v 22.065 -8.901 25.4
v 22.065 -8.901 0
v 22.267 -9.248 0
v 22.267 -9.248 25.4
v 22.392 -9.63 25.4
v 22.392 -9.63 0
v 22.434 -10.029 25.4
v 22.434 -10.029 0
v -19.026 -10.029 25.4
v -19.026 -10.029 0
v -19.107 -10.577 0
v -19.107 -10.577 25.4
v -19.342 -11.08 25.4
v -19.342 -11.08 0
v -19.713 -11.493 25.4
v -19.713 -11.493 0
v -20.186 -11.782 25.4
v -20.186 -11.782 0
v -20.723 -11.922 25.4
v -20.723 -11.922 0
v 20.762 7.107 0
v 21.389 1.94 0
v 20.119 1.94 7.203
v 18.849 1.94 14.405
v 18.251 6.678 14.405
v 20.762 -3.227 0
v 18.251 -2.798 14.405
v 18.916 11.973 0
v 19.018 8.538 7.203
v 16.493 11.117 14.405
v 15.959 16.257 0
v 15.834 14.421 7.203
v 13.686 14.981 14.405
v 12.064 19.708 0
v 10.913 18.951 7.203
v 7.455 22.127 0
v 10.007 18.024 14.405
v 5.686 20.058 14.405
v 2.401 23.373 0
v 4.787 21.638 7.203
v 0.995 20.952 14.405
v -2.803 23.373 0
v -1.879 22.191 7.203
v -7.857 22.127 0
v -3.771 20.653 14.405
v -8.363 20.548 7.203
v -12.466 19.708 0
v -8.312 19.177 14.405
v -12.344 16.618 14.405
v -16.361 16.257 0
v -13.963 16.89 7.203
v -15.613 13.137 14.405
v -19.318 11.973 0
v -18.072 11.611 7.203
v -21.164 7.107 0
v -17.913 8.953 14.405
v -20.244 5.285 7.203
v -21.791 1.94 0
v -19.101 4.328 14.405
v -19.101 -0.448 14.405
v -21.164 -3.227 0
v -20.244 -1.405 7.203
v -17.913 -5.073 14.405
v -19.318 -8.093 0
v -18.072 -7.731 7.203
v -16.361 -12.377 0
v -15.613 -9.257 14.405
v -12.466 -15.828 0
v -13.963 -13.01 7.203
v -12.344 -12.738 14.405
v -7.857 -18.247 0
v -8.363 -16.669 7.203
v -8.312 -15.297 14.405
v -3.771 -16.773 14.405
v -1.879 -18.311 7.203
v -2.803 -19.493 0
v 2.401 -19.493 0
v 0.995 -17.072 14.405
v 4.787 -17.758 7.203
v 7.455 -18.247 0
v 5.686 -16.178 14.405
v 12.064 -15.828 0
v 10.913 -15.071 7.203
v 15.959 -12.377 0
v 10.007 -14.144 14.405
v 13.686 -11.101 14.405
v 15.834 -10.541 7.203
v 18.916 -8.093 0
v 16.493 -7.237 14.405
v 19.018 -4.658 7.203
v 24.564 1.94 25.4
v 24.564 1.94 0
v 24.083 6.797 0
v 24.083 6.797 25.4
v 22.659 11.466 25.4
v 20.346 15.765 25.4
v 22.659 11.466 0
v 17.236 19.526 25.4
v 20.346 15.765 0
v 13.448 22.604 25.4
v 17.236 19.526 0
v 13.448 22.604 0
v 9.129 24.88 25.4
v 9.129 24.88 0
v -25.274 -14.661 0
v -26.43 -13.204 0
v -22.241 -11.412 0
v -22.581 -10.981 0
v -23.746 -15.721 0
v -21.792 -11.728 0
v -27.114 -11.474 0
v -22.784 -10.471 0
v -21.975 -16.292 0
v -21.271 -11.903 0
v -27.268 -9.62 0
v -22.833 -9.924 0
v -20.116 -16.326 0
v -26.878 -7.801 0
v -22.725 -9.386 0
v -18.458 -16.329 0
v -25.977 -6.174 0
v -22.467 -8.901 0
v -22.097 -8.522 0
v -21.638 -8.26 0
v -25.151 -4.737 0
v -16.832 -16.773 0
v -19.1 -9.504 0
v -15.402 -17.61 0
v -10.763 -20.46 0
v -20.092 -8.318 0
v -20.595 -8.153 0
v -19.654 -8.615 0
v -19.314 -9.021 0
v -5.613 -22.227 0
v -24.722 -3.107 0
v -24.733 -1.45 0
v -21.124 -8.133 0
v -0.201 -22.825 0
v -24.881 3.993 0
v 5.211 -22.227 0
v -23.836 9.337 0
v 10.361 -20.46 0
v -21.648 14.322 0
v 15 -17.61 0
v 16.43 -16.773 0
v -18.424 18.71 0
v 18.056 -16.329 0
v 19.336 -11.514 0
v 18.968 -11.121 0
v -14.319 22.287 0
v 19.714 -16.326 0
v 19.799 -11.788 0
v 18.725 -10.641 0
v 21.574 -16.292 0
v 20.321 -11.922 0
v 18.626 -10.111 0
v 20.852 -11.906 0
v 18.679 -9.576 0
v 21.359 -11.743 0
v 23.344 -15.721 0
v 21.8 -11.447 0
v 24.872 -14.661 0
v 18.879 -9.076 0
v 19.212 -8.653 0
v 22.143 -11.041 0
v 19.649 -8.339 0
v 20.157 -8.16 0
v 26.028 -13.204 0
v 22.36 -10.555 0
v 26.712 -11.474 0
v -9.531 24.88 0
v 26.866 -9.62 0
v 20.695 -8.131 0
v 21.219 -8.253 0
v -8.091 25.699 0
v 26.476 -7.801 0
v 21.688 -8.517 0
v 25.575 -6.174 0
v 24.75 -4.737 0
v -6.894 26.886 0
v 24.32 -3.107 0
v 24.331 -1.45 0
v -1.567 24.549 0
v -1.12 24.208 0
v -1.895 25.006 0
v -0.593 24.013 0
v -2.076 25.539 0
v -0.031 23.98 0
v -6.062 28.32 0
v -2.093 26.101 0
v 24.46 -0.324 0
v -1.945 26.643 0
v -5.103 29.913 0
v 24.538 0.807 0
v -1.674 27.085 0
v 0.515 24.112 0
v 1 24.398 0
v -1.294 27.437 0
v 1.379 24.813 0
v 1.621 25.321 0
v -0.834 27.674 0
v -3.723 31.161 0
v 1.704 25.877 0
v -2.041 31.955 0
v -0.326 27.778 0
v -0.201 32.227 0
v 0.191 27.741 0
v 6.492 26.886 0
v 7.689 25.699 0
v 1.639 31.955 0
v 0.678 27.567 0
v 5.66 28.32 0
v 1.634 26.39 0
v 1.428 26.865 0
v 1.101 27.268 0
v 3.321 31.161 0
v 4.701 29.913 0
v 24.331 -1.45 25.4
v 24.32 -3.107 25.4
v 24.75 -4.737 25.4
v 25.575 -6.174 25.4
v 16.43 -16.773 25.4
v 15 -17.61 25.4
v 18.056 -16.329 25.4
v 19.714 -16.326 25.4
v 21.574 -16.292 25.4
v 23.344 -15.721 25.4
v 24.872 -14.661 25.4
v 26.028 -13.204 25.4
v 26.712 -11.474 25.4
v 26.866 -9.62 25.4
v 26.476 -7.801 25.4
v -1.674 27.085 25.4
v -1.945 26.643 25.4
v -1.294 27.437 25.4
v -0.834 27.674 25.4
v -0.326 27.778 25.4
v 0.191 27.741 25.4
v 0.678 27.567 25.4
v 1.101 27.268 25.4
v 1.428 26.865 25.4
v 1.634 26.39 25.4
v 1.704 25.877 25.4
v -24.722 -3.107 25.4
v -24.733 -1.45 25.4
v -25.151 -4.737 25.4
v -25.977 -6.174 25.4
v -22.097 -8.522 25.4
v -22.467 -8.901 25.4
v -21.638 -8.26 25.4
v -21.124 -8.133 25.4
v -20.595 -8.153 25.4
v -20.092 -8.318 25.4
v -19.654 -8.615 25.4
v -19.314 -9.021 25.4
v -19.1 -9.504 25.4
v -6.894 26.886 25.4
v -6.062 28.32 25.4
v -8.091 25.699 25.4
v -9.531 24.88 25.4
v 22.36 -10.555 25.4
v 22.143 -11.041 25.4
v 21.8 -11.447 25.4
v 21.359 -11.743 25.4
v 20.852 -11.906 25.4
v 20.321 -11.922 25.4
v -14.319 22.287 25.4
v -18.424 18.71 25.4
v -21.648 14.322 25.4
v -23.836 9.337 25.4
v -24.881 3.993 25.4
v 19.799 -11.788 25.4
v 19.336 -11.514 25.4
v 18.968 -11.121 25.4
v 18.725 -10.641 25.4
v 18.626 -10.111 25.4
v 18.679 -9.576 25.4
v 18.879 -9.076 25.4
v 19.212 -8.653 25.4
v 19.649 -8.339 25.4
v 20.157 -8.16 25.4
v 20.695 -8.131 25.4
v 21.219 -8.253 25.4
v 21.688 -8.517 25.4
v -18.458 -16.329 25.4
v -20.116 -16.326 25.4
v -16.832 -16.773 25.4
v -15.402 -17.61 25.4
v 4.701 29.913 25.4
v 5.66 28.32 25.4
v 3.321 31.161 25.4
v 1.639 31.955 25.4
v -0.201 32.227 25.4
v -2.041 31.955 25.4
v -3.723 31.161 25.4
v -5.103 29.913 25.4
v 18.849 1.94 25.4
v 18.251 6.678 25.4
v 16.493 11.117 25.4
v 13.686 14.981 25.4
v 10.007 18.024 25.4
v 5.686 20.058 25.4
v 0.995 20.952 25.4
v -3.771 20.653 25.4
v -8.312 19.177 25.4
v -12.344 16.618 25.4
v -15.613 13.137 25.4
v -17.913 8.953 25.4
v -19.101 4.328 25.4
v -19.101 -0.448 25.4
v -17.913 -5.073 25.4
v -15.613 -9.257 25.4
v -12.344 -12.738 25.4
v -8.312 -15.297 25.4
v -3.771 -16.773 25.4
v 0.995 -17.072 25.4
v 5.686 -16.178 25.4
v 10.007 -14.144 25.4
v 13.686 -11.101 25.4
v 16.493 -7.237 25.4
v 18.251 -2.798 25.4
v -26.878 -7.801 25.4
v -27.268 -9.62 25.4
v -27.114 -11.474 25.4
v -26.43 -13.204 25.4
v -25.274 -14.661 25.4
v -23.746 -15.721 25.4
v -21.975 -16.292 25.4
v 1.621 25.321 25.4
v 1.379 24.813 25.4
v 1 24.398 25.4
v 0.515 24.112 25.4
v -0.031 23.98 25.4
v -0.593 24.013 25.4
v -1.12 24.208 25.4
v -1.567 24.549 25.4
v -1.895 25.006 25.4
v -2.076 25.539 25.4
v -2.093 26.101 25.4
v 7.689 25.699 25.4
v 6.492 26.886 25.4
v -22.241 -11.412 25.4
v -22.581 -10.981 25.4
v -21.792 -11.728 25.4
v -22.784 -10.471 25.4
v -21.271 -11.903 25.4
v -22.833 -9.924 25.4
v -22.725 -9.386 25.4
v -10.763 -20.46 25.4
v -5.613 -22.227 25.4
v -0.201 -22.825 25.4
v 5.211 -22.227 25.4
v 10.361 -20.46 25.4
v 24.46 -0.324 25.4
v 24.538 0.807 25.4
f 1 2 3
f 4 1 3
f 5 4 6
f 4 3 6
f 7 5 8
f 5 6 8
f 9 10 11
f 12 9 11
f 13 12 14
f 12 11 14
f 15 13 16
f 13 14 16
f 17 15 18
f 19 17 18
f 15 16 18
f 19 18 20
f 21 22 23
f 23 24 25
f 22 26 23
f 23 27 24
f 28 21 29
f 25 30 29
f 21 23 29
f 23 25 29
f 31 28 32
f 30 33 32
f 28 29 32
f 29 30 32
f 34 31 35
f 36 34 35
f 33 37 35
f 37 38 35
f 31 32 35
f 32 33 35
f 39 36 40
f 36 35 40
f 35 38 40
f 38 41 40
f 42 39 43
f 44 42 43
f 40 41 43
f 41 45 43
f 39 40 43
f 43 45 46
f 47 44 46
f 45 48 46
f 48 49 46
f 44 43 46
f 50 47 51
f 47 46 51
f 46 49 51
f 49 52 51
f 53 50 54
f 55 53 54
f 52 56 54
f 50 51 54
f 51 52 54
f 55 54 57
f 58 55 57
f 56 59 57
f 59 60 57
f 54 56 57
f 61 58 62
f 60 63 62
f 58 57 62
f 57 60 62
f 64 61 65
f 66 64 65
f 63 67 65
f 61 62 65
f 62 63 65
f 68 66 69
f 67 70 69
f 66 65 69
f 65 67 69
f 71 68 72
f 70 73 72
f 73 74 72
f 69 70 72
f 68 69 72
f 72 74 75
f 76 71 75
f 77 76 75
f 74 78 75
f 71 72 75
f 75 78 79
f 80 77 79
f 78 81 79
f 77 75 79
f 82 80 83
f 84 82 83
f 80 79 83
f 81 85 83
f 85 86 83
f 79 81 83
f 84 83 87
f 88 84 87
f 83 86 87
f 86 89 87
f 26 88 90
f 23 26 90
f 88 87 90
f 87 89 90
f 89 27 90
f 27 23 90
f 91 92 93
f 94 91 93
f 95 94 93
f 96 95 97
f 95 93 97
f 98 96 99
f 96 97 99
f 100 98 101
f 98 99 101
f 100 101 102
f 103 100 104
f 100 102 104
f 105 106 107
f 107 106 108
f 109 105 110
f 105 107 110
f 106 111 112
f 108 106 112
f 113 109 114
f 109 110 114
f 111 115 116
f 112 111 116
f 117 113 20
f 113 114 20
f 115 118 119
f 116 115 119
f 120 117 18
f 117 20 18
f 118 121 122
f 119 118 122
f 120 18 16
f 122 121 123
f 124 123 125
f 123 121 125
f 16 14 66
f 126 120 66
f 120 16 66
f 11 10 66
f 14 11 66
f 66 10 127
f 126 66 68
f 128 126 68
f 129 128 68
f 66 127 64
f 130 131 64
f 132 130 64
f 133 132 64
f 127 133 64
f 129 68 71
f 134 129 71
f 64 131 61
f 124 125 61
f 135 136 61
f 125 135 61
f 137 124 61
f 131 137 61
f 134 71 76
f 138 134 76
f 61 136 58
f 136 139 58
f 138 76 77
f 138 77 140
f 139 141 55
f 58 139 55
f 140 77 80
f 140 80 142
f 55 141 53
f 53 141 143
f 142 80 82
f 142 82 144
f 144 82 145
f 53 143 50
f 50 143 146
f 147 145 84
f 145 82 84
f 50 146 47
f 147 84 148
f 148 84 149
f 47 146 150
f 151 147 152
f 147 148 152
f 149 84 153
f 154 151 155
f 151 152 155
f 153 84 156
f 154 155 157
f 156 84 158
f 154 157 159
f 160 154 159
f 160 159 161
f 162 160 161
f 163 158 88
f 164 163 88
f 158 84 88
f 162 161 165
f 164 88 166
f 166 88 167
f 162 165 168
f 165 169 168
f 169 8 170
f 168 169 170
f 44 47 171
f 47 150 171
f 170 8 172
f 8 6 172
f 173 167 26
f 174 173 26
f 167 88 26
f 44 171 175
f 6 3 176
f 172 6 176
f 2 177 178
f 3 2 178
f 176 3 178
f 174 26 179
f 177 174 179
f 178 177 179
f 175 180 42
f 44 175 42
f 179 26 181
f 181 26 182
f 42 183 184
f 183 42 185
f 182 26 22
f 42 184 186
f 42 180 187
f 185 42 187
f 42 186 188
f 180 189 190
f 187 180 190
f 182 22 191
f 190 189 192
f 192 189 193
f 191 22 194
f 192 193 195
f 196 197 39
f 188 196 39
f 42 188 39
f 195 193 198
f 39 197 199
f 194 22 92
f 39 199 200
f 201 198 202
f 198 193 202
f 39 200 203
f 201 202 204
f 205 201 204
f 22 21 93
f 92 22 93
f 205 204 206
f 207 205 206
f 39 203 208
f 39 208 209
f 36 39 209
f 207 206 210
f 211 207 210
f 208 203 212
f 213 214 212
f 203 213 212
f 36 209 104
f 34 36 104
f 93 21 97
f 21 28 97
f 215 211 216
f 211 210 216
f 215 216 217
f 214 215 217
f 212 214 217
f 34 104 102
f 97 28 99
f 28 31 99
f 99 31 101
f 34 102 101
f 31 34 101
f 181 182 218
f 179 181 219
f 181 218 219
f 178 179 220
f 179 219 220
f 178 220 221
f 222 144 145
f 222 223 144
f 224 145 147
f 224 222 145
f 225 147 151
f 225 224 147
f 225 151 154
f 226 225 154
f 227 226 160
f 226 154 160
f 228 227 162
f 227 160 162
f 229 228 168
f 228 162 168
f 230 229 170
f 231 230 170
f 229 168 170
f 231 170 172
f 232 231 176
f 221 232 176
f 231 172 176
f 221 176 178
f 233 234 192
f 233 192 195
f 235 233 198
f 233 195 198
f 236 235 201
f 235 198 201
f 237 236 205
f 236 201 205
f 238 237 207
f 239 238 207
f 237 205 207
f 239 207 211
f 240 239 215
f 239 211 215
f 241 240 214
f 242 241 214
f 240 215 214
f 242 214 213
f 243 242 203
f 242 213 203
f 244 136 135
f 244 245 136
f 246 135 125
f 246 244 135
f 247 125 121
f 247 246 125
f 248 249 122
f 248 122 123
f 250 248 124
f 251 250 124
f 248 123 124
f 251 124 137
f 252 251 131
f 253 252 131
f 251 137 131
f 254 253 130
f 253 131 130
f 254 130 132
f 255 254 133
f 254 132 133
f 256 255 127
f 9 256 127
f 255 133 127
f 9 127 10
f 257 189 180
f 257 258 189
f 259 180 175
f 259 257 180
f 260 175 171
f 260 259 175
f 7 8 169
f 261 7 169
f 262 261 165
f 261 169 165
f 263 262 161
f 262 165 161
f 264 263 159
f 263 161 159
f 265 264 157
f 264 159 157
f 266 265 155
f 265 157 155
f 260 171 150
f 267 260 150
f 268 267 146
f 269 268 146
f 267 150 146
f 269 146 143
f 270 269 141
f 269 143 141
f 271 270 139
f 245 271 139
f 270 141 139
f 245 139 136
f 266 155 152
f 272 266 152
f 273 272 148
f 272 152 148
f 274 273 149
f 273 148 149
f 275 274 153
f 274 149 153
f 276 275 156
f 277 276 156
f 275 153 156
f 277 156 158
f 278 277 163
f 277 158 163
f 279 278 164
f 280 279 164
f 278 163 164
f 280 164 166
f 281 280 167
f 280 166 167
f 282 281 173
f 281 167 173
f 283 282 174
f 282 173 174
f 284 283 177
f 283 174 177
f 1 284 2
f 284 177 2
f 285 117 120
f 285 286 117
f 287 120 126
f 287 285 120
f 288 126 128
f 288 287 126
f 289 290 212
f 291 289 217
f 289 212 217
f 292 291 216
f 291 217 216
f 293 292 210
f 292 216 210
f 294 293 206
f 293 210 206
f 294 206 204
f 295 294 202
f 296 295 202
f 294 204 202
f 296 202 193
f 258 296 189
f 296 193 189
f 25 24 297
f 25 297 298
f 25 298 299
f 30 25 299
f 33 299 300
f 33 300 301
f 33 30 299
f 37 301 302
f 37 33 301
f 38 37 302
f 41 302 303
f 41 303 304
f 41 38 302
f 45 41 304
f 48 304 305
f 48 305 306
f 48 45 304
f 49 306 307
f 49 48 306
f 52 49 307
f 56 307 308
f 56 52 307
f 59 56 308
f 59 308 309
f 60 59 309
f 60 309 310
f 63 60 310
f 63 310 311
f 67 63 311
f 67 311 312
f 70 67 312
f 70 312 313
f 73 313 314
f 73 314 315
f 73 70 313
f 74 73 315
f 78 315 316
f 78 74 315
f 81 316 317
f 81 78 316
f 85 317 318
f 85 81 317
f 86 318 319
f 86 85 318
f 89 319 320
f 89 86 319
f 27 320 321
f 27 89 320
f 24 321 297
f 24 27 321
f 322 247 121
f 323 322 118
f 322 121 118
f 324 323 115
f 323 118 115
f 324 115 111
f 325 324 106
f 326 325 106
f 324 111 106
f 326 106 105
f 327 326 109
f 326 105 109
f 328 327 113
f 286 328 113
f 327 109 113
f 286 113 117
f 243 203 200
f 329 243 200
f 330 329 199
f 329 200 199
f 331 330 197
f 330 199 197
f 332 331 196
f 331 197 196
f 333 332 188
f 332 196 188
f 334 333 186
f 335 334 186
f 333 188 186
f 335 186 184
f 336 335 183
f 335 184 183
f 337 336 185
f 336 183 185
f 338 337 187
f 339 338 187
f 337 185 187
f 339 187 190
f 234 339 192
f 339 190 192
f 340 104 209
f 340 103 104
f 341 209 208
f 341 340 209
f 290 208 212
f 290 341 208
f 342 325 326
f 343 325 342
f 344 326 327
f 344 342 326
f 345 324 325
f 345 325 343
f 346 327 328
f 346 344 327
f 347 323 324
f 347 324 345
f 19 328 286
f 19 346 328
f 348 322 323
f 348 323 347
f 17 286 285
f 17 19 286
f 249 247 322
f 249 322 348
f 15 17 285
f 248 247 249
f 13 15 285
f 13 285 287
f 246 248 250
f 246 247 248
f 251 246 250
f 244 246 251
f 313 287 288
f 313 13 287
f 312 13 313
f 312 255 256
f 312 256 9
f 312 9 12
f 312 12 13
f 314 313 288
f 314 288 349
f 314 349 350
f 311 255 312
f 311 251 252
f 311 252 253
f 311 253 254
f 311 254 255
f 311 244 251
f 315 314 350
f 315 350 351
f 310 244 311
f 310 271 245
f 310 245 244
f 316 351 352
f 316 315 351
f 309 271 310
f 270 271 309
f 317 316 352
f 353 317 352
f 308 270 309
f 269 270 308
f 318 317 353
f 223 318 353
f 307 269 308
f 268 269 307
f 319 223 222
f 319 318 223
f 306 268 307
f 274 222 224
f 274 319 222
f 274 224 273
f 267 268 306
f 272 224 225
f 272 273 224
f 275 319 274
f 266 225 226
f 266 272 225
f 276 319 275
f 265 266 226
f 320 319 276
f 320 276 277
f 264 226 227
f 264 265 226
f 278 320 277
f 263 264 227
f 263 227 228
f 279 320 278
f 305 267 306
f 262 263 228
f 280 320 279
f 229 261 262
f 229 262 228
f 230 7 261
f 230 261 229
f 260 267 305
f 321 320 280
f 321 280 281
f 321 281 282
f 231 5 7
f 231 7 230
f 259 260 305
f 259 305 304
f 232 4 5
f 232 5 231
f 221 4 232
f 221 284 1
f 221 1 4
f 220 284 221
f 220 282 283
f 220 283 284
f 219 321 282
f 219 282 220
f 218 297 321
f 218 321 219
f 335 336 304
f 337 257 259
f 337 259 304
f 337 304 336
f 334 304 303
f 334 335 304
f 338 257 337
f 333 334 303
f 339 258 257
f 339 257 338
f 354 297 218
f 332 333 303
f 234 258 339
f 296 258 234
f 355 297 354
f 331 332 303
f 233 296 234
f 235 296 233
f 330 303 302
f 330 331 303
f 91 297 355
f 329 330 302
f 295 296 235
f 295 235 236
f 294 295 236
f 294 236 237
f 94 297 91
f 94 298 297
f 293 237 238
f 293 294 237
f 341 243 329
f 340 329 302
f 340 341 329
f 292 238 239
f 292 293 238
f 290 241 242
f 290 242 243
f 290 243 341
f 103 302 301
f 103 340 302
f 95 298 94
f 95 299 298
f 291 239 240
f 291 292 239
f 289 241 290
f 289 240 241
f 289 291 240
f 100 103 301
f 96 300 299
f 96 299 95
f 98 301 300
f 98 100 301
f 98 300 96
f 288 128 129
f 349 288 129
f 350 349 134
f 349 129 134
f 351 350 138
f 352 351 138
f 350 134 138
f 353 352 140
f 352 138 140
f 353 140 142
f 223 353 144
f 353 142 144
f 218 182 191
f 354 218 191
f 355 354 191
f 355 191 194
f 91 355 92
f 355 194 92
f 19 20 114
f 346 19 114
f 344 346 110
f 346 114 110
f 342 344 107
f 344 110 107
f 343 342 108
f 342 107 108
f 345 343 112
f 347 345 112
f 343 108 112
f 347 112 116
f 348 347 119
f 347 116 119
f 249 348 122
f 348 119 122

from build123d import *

# Parameters (mm, degrees)
F0_R     = 19.05
F1_DEPTH = 25.4
F2_R     = 6.35
F3_SIZE2 = 14.4050558218
F3_SIZE  = 2.54


with BuildPart() as f1:
    # F0 (on Top) → F1 (new body)
    with BuildSketch(Plane.XY):
        with BuildLine():
            ThreePointArc((23.7041161885, -4.5293078328), (24.3480999851, -1.3231236326), (24.564016243, 1.9399596371))
            ThreePointArc((24.564016243, 1.9399596371), (19.4276047684, 17.0404145143), (6.149016243, 25.8770172048))
            ThreePointArc((6.149016243, 25.8770172048), (3.8641251316, 26.3690430158), (1.5430253852, 26.6434747131))
            ThreePointArc((1.5430253852, 26.6434747131), (1.6633341365, 26.2686085633), (1.704016243, 25.8770172048))
            ThreePointArc((1.704016243, 25.8770172048), (-0.5925751155, 24.0126993113), (-1.9449928991, 26.6434747131))
            ThreePointArc((-1.9449928991, 26.6434747131), (-4.2660926456, 26.3690430158), (-6.550983757, 25.8770172048))
            ThreePointArc((-6.550983757, 25.8770172048), (-21.6481028817, 14.3224596371), (-24.1060837025, -4.5293078328))
            ThreePointArc((-24.1060837025, -4.5293078328), (-23.3897449984, -6.7540944856), (-22.4668599467, -8.9014416794))
            ThreePointArc((-22.4668599467, -8.9014416794), (-20.3380528201, -8.218226811), (-19.0260837025, -10.0285691468))
            ThreePointArc((-19.0260837025, -10.0285691468), (-19.5123327253, -11.2998561579), (-20.7228508045, -11.9221541225))
            ThreePointArc((-20.7228508045, -11.9221541225), (-19.3246361098, -13.795069619), (-17.7560837025, -15.5278304608))
            ThreePointArc((-17.7560837025, -15.5278304608), (-0.200983757, -22.8250403629), (17.3541161885, -15.5278304608))
            ThreePointArc((17.3541161885, -15.5278304608), (18.9226685958, -13.795069619), (20.3208832906, -11.9221541225))
            ThreePointArc((20.3208832906, -11.9221541225), (18.8793377943, -9.0760691468), (22.0648924327, -8.9014416794))
            ThreePointArc((22.0648924327, -8.9014416794), (22.9877774845, -6.7540944856), (23.7041161885, -4.5293078328))
        make_face()
        with Locations((-0.200983757, 1.9399596371)):
            Circle(F0_R, mode=Mode.SUBTRACT)
        with BuildLine():
            ThreePointArc((1.5430253852, 26.6434747131), (3.8641251316, 26.3690430158), (6.149016243, 25.8770172048))
            ThreePointArc((6.149016243, 25.8770172048), (-0.200983757, 32.2270172048), (-6.550983757, 25.8770172048))
            ThreePointArc((-6.550983757, 25.8770172048), (-4.2660926456, 26.3690430158), (-1.9449928991, 26.6434747131))
            ThreePointArc((-1.9449928991, 26.6434747131), (-0.200983757, 27.7820172048), (1.5430253852, 26.6434747131))
        make_face()
        with BuildLine():
            ThreePointArc((17.3541161885, -15.5278304608), (26.0283775025, -13.2035691468), (23.7041161885, -4.5293078328))
            ThreePointArc((23.7041161885, -4.5293078328), (22.9877774845, -6.7540944856), (22.0648924327, -8.9014416794))
            ThreePointArc((22.0648924327, -8.9014416794), (22.3394585243, -9.4355382645), (22.4341161885, -10.0285691468))
            ThreePointArc((22.4341161885, -10.0285691468), (21.8004031997, -11.447320124), (20.3208832906, -11.9221541225))
            ThreePointArc((20.3208832906, -11.9221541225), (18.9226685958, -13.795069619), (17.3541161885, -15.5278304608))
        make_face()
        with BuildLine():
            ThreePointArc((-22.4668599467, -8.9014416794), (-23.3897449984, -6.7540944856), (-24.1060837025, -4.5293078328))
            ThreePointArc((-24.1060837025, -4.5293078328), (-26.4303450165, -13.2035691468), (-17.7560837025, -15.5278304608))
            ThreePointArc((-17.7560837025, -15.5278304608), (-19.3246361098, -13.795069619), (-20.7228508045, -11.9221541225))
            ThreePointArc((-20.7228508045, -11.9221541225), (-22.5808620967, -10.9810691468), (-22.4668599467, -8.9014416794))
        make_face()
    extrude(amount=F1_DEPTH)

    # F2
    f2_edges = [f1.edges().sort_by_distance(p)[0] for p in [
        (-24.106084, -4.529308, 12.7),
        (17.354116, -15.52783, 12.7),
        (6.149016, 25.877017, 12.7),
        (23.704116, -4.529308, 12.7),
        (-6.550984, 25.877017, 12.7),
        (-17.756084, -15.52783, 12.7),
    ]]
    fillet(f2_edges, radius=F2_R)

    # F3
    f3_edges = [f1.edges().sort_by_distance(p)[0] for p in [
        (-19.250984, 1.93996, 0),
    ]]
    f3_side = f1.faces().sort_by_distance((20.577327, 13.936323, 0))[0]
    chamfer(f3_edges, length=F3_SIZE, length2=F3_SIZE2, reference=f3_side)


solid = f1.part
